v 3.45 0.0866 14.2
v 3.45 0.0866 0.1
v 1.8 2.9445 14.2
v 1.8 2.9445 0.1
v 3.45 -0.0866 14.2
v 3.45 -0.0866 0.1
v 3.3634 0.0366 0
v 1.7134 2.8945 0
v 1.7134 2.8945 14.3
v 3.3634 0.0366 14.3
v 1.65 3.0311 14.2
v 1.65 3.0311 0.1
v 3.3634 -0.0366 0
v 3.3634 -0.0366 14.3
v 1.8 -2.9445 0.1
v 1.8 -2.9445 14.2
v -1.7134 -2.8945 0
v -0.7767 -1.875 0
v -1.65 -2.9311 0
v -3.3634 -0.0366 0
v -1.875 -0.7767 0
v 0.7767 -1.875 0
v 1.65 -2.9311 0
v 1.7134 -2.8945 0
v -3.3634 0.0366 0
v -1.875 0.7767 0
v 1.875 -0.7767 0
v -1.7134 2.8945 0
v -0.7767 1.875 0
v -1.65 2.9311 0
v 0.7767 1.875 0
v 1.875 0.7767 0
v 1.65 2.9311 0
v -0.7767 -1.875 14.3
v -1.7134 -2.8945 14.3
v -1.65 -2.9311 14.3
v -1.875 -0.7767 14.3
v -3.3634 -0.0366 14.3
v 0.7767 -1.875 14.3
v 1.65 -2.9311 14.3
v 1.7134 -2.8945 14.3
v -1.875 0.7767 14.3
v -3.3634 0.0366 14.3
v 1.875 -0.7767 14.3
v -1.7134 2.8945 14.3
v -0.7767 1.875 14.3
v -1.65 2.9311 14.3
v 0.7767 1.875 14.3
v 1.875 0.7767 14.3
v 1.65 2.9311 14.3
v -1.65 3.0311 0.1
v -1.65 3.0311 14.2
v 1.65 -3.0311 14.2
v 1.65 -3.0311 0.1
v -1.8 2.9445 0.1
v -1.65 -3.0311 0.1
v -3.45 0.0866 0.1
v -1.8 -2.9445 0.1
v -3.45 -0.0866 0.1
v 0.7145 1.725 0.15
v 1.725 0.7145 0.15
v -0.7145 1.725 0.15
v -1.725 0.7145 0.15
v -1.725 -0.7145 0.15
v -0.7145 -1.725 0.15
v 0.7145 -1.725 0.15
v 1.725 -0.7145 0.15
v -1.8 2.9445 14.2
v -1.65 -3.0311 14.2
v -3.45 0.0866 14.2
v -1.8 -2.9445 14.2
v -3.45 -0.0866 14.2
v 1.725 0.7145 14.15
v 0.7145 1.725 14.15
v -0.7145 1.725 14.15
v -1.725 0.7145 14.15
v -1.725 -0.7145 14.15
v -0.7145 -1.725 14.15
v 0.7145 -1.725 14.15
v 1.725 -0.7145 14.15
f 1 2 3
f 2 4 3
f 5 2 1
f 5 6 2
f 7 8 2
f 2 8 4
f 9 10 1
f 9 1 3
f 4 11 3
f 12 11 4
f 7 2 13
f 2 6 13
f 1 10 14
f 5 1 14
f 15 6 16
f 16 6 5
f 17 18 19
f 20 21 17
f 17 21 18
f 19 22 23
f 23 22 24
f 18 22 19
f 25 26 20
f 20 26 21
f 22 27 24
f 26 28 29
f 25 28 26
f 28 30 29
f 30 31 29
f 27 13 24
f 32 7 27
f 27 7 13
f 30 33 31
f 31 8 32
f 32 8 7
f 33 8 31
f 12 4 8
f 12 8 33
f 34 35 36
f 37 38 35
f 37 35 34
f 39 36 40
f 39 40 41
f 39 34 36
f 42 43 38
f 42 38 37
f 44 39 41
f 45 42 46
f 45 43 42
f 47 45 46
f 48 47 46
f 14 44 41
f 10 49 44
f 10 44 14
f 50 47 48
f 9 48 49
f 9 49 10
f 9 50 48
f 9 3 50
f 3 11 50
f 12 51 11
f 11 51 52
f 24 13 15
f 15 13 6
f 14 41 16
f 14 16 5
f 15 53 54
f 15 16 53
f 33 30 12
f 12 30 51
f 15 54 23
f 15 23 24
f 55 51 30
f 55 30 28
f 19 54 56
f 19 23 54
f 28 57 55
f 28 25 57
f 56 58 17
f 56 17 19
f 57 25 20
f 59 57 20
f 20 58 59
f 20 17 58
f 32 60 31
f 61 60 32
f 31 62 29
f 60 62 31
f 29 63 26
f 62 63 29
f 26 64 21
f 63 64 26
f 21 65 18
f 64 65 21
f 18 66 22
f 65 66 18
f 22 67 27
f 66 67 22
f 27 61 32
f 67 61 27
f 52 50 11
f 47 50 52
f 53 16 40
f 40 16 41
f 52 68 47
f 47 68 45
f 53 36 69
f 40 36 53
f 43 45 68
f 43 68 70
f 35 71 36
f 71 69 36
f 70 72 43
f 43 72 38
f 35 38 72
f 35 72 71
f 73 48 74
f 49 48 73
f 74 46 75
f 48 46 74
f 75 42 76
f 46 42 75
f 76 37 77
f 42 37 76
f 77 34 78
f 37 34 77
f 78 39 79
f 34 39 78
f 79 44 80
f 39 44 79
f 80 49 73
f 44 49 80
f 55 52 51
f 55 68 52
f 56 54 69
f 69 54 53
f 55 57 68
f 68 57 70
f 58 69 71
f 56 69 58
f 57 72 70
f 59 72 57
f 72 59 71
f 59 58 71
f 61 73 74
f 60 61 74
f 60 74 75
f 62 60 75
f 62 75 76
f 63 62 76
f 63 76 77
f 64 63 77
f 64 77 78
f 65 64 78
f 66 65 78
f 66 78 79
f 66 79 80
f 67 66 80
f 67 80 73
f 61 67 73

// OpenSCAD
// Generated variant: spec/build_parent_main_polygon.py.
polyhedron(points=[[3.450000047683716, 0.08660253882408142, 14.199999809265137], [3.450000047683716, 0.08660253882408142, 0.10000000149011612], [1.7999999523162842, 2.944486379623413, 14.199999809265137], [1.7999999523162842, 2.944486379623413, 0.10000000149011612], [3.450000047683716, -0.08660253882408142, 14.199999809265137], [3.450000047683716, -0.08660253882408142, 0.10000000149011612], [3.3633973598480225, 0.03660254180431366, 0.0], [1.71339750289917, 2.894486427307129, 0.0], [1.71339750289917, 2.894486427307129, 14.300000190734863], [3.3633973598480225, 0.03660254180431366, 14.300000190734863], [1.649999976158142, 3.0310888290405273, 14.199999809265137], [1.649999976158142, 3.0310888290405273, 0.10000000149011612], [3.3633973598480225, -0.03660254180431366, 0.0], [3.3633973598480225, -0.03660254180431366, 14.300000190734863], [1.7999999523162842, -2.944486379623413, 0.10000000149011612], [1.7999999523162842, -2.944486379623413, 14.199999809265137], [-1.71339750289917, -2.894486427307129, 0.0], [-0.7766504287719727, -1.875, 0.0], [-1.649999976158142, -2.931088924407959, 0.0], [-3.3633973598480225, -0.03660254180431366, 0.0], [-1.875, -0.7766504287719727, 0.0], [0.7766504287719727, -1.875, 0.0], [1.649999976158142, -2.931088924407959, 0.0], [1.71339750289917, -2.894486427307129, 0.0], [-3.3633973598480225, 0.03660254180431366, 0.0], [-1.875, 0.7766504287719727, 0.0], [1.875, -0.7766504287719727, 0.0], [-1.71339750289917, 2.894486427307129, 0.0], [-0.7766504287719727, 1.875, 0.0], [-1.649999976158142, 2.931088924407959, 0.0], [0.7766504287719727, 1.875, 0.0], [1.875, 0.7766504287719727, 0.0], [1.649999976158142, 2.931088924407959, 0.0], [-0.7766504287719727, -1.875, 14.300000190734863], [-1.71339750289917, -2.894486427307129, 14.300000190734863], [-1.649999976158142, -2.931088924407959, 14.300000190734863], [-1.875, -0.7766504287719727, 14.300000190734863], [-3.3633973598480225, -0.03660254180431366, 14.300000190734863], [0.7766504287719727, -1.875, 14.300000190734863], [1.649999976158142, -2.931088924407959, 14.300000190734863], [1.71339750289917, -2.894486427307129, 14.300000190734863], [-1.875, 0.7766504287719727, 14.300000190734863], [-3.3633973598480225, 0.03660254180431366, 14.300000190734863], [1.875, -0.7766504287719727, 14.300000190734863], [-1.71339750289917, 2.894486427307129, 14.300000190734863], [-0.7766504287719727, 1.875, 14.300000190734863], [-1.649999976158142, 2.931088924407959, 14.300000190734863], [0.7766504287719727, 1.875, 14.300000190734863], [1.875, 0.7766504287719727, 14.300000190734863], [1.649999976158142, 2.931088924407959, 14.300000190734863], [-1.649999976158142, 3.0310888290405273, 0.10000000149011612], [-1.649999976158142, 3.0310888290405273, 14.199999809265137], [1.649999976158142, -3.0310888290405273, 14.199999809265137], [1.649999976158142, -3.0310888290405273, 0.10000000149011612], [-1.7999999523162842, 2.944486379623413, 0.10000000149011612], [-1.649999976158142, -3.0310888290405273, 0.10000000149011612], [-3.450000047683716, 0.08660253882408142, 0.10000000149011612], [-1.7999999523162842, -2.944486379623413, 0.10000000149011612], [-3.450000047683716, -0.08660253882408142, 0.10000000149011612], [0.7145183682441711, 1.725000023841858, 0.15000000596046448], [1.725000023841858, 0.7145183682441711, 0.15000000596046448], [-0.7145183682441711, 1.725000023841858, 0.15000000596046448], [-1.725000023841858, 0.7145183682441711, 0.15000000596046448], [-1.725000023841858, -0.7145183682441711, 0.15000000596046448], [-0.7145183682441711, -1.725000023841858, 0.15000000596046448], [0.7145183682441711, -1.725000023841858, 0.15000000596046448], [1.725000023841858, -0.7145183682441711, 0.15000000596046448], [-1.7999999523162842, 2.944486379623413, 14.199999809265137], [-1.649999976158142, -3.0310888290405273, 14.199999809265137], [-3.450000047683716, 0.08660253882408142, 14.199999809265137], [-1.7999999523162842, -2.944486379623413, 14.199999809265137], [-3.450000047683716, -0.08660253882408142, 14.199999809265137], [1.725000023841858, 0.7145183682441711, 14.149999618530273], [0.7145183682441711, 1.725000023841858, 14.149999618530273], [-0.7145183682441711, 1.725000023841858, 14.149999618530273], [-1.725000023841858, 0.7145183682441711, 14.149999618530273], [-1.725000023841858, -0.7145183682441711, 14.149999618530273], [-0.7145183682441711, -1.725000023841858, 14.149999618530273], [0.7145183682441711, -1.725000023841858, 14.149999618530273], [1.725000023841858, -0.7145183682441711, 14.149999618530273]],faces=[[2, 1, 0], [2, 3, 1], [0, 1, 4], [1, 5, 4], [1, 7, 6], [3, 7, 1], [0, 9, 8], [2, 0, 8], [2, 10, 3], [3, 10, 11], [12, 1, 6], [12, 5, 1], [13, 9, 0], [13, 0, 4], [15, 5, 14], [4, 5, 15], [18, 17, 16], [16, 20, 19], [17, 20, 16], [22, 21, 18], [23, 21, 22], [18, 21, 17], [19, 25, 24], [20, 25, 19], [23, 26, 21], [28, 27, 25], [25, 27, 24], [28, 29, 27], [28, 30, 29], [23, 12, 26], [26, 6, 31], [12, 6, 26], [30, 32, 29], [31, 7, 30], [6, 7, 31], [30, 7, 32], [7, 3, 11], [32, 7, 11], [35, 34, 33], [34, 37, 36], [33, 34, 36], [39, 35, 38], [40, 39, 38], [35, 33, 38], [37, 42, 41], [36, 37, 41], [40, 38, 43], [45, 41, 44], [41, 42, 44], [45, 44, 46], [45, 46, 47], [40, 43, 13], [43, 48, 9], [13, 43, 9], [47, 46, 49], [48, 47, 8], [9, 48, 8], [47, 49, 8], [49, 2, 8], [49, 10, 2], [10, 50, 11], [51, 50, 10], [14, 12, 23], [5, 12, 14], [15, 40, 13], [4, 15, 13], [53, 52, 14], [52, 15, 14], [11, 29, 32], [50, 29, 11], [22, 53, 14], [23, 22, 14], [29, 50, 54], [27, 29, 54], [55, 53, 18], [53, 22, 18], [54, 56, 27], [56, 24, 27], [16, 57, 55], [18, 16, 55], [19, 24, 56], [19, 56, 58], [58, 57, 19], [57, 16, 19], [30, 59, 31], [31, 59, 60], [28, 61, 30], [30, 61, 59], [25, 62, 28], [28, 62, 61], [20, 63, 25], [25, 63, 62], [17, 64, 20], [20, 64, 63], [21, 65, 17], [17, 65, 64], [26, 66, 21], [21, 66, 65], [31, 60, 26], [26, 60, 66], [10, 49, 51], [51, 49, 46], [39, 15, 52], [40, 15, 39], [46, 67, 51], [44, 67, 46], [68, 35, 52], [52, 35, 39], [67, 44, 42], [69, 67, 42], [35, 70, 34], [35, 68, 70], [42, 71, 69], [37, 71, 42], [71, 37, 34], [70, 71, 34], [73, 47, 72], [72, 47, 48], [74, 45, 73], [73, 45, 47], [75, 41, 74], [74, 41, 45], [76, 36, 75], [75, 36, 41], [77, 33, 76], [76, 33, 36], [78, 38, 77], [77, 38, 33], [79, 43, 78], [78, 43, 38], [72, 48, 79], [79, 48, 43], [50, 51, 54], [51, 67, 54], [68, 53, 55], [52, 53, 68], [67, 56, 54], [69, 56, 67], [70, 68, 57], [57, 68, 55], [69, 71, 56], [56, 71, 58], [70, 58, 71], [70, 57, 58], [73, 72, 60], [73, 60, 59], [74, 73, 59], [74, 59, 61], [75, 74, 61], [75, 61, 62], [76, 75, 62], [76, 62, 63], [77, 76, 63], [77, 63, 64], [77, 64, 65], [78, 77, 65], [79, 78, 65], [79, 65, 66], [72, 79, 66], [72, 66, 60]],convexity=10);
